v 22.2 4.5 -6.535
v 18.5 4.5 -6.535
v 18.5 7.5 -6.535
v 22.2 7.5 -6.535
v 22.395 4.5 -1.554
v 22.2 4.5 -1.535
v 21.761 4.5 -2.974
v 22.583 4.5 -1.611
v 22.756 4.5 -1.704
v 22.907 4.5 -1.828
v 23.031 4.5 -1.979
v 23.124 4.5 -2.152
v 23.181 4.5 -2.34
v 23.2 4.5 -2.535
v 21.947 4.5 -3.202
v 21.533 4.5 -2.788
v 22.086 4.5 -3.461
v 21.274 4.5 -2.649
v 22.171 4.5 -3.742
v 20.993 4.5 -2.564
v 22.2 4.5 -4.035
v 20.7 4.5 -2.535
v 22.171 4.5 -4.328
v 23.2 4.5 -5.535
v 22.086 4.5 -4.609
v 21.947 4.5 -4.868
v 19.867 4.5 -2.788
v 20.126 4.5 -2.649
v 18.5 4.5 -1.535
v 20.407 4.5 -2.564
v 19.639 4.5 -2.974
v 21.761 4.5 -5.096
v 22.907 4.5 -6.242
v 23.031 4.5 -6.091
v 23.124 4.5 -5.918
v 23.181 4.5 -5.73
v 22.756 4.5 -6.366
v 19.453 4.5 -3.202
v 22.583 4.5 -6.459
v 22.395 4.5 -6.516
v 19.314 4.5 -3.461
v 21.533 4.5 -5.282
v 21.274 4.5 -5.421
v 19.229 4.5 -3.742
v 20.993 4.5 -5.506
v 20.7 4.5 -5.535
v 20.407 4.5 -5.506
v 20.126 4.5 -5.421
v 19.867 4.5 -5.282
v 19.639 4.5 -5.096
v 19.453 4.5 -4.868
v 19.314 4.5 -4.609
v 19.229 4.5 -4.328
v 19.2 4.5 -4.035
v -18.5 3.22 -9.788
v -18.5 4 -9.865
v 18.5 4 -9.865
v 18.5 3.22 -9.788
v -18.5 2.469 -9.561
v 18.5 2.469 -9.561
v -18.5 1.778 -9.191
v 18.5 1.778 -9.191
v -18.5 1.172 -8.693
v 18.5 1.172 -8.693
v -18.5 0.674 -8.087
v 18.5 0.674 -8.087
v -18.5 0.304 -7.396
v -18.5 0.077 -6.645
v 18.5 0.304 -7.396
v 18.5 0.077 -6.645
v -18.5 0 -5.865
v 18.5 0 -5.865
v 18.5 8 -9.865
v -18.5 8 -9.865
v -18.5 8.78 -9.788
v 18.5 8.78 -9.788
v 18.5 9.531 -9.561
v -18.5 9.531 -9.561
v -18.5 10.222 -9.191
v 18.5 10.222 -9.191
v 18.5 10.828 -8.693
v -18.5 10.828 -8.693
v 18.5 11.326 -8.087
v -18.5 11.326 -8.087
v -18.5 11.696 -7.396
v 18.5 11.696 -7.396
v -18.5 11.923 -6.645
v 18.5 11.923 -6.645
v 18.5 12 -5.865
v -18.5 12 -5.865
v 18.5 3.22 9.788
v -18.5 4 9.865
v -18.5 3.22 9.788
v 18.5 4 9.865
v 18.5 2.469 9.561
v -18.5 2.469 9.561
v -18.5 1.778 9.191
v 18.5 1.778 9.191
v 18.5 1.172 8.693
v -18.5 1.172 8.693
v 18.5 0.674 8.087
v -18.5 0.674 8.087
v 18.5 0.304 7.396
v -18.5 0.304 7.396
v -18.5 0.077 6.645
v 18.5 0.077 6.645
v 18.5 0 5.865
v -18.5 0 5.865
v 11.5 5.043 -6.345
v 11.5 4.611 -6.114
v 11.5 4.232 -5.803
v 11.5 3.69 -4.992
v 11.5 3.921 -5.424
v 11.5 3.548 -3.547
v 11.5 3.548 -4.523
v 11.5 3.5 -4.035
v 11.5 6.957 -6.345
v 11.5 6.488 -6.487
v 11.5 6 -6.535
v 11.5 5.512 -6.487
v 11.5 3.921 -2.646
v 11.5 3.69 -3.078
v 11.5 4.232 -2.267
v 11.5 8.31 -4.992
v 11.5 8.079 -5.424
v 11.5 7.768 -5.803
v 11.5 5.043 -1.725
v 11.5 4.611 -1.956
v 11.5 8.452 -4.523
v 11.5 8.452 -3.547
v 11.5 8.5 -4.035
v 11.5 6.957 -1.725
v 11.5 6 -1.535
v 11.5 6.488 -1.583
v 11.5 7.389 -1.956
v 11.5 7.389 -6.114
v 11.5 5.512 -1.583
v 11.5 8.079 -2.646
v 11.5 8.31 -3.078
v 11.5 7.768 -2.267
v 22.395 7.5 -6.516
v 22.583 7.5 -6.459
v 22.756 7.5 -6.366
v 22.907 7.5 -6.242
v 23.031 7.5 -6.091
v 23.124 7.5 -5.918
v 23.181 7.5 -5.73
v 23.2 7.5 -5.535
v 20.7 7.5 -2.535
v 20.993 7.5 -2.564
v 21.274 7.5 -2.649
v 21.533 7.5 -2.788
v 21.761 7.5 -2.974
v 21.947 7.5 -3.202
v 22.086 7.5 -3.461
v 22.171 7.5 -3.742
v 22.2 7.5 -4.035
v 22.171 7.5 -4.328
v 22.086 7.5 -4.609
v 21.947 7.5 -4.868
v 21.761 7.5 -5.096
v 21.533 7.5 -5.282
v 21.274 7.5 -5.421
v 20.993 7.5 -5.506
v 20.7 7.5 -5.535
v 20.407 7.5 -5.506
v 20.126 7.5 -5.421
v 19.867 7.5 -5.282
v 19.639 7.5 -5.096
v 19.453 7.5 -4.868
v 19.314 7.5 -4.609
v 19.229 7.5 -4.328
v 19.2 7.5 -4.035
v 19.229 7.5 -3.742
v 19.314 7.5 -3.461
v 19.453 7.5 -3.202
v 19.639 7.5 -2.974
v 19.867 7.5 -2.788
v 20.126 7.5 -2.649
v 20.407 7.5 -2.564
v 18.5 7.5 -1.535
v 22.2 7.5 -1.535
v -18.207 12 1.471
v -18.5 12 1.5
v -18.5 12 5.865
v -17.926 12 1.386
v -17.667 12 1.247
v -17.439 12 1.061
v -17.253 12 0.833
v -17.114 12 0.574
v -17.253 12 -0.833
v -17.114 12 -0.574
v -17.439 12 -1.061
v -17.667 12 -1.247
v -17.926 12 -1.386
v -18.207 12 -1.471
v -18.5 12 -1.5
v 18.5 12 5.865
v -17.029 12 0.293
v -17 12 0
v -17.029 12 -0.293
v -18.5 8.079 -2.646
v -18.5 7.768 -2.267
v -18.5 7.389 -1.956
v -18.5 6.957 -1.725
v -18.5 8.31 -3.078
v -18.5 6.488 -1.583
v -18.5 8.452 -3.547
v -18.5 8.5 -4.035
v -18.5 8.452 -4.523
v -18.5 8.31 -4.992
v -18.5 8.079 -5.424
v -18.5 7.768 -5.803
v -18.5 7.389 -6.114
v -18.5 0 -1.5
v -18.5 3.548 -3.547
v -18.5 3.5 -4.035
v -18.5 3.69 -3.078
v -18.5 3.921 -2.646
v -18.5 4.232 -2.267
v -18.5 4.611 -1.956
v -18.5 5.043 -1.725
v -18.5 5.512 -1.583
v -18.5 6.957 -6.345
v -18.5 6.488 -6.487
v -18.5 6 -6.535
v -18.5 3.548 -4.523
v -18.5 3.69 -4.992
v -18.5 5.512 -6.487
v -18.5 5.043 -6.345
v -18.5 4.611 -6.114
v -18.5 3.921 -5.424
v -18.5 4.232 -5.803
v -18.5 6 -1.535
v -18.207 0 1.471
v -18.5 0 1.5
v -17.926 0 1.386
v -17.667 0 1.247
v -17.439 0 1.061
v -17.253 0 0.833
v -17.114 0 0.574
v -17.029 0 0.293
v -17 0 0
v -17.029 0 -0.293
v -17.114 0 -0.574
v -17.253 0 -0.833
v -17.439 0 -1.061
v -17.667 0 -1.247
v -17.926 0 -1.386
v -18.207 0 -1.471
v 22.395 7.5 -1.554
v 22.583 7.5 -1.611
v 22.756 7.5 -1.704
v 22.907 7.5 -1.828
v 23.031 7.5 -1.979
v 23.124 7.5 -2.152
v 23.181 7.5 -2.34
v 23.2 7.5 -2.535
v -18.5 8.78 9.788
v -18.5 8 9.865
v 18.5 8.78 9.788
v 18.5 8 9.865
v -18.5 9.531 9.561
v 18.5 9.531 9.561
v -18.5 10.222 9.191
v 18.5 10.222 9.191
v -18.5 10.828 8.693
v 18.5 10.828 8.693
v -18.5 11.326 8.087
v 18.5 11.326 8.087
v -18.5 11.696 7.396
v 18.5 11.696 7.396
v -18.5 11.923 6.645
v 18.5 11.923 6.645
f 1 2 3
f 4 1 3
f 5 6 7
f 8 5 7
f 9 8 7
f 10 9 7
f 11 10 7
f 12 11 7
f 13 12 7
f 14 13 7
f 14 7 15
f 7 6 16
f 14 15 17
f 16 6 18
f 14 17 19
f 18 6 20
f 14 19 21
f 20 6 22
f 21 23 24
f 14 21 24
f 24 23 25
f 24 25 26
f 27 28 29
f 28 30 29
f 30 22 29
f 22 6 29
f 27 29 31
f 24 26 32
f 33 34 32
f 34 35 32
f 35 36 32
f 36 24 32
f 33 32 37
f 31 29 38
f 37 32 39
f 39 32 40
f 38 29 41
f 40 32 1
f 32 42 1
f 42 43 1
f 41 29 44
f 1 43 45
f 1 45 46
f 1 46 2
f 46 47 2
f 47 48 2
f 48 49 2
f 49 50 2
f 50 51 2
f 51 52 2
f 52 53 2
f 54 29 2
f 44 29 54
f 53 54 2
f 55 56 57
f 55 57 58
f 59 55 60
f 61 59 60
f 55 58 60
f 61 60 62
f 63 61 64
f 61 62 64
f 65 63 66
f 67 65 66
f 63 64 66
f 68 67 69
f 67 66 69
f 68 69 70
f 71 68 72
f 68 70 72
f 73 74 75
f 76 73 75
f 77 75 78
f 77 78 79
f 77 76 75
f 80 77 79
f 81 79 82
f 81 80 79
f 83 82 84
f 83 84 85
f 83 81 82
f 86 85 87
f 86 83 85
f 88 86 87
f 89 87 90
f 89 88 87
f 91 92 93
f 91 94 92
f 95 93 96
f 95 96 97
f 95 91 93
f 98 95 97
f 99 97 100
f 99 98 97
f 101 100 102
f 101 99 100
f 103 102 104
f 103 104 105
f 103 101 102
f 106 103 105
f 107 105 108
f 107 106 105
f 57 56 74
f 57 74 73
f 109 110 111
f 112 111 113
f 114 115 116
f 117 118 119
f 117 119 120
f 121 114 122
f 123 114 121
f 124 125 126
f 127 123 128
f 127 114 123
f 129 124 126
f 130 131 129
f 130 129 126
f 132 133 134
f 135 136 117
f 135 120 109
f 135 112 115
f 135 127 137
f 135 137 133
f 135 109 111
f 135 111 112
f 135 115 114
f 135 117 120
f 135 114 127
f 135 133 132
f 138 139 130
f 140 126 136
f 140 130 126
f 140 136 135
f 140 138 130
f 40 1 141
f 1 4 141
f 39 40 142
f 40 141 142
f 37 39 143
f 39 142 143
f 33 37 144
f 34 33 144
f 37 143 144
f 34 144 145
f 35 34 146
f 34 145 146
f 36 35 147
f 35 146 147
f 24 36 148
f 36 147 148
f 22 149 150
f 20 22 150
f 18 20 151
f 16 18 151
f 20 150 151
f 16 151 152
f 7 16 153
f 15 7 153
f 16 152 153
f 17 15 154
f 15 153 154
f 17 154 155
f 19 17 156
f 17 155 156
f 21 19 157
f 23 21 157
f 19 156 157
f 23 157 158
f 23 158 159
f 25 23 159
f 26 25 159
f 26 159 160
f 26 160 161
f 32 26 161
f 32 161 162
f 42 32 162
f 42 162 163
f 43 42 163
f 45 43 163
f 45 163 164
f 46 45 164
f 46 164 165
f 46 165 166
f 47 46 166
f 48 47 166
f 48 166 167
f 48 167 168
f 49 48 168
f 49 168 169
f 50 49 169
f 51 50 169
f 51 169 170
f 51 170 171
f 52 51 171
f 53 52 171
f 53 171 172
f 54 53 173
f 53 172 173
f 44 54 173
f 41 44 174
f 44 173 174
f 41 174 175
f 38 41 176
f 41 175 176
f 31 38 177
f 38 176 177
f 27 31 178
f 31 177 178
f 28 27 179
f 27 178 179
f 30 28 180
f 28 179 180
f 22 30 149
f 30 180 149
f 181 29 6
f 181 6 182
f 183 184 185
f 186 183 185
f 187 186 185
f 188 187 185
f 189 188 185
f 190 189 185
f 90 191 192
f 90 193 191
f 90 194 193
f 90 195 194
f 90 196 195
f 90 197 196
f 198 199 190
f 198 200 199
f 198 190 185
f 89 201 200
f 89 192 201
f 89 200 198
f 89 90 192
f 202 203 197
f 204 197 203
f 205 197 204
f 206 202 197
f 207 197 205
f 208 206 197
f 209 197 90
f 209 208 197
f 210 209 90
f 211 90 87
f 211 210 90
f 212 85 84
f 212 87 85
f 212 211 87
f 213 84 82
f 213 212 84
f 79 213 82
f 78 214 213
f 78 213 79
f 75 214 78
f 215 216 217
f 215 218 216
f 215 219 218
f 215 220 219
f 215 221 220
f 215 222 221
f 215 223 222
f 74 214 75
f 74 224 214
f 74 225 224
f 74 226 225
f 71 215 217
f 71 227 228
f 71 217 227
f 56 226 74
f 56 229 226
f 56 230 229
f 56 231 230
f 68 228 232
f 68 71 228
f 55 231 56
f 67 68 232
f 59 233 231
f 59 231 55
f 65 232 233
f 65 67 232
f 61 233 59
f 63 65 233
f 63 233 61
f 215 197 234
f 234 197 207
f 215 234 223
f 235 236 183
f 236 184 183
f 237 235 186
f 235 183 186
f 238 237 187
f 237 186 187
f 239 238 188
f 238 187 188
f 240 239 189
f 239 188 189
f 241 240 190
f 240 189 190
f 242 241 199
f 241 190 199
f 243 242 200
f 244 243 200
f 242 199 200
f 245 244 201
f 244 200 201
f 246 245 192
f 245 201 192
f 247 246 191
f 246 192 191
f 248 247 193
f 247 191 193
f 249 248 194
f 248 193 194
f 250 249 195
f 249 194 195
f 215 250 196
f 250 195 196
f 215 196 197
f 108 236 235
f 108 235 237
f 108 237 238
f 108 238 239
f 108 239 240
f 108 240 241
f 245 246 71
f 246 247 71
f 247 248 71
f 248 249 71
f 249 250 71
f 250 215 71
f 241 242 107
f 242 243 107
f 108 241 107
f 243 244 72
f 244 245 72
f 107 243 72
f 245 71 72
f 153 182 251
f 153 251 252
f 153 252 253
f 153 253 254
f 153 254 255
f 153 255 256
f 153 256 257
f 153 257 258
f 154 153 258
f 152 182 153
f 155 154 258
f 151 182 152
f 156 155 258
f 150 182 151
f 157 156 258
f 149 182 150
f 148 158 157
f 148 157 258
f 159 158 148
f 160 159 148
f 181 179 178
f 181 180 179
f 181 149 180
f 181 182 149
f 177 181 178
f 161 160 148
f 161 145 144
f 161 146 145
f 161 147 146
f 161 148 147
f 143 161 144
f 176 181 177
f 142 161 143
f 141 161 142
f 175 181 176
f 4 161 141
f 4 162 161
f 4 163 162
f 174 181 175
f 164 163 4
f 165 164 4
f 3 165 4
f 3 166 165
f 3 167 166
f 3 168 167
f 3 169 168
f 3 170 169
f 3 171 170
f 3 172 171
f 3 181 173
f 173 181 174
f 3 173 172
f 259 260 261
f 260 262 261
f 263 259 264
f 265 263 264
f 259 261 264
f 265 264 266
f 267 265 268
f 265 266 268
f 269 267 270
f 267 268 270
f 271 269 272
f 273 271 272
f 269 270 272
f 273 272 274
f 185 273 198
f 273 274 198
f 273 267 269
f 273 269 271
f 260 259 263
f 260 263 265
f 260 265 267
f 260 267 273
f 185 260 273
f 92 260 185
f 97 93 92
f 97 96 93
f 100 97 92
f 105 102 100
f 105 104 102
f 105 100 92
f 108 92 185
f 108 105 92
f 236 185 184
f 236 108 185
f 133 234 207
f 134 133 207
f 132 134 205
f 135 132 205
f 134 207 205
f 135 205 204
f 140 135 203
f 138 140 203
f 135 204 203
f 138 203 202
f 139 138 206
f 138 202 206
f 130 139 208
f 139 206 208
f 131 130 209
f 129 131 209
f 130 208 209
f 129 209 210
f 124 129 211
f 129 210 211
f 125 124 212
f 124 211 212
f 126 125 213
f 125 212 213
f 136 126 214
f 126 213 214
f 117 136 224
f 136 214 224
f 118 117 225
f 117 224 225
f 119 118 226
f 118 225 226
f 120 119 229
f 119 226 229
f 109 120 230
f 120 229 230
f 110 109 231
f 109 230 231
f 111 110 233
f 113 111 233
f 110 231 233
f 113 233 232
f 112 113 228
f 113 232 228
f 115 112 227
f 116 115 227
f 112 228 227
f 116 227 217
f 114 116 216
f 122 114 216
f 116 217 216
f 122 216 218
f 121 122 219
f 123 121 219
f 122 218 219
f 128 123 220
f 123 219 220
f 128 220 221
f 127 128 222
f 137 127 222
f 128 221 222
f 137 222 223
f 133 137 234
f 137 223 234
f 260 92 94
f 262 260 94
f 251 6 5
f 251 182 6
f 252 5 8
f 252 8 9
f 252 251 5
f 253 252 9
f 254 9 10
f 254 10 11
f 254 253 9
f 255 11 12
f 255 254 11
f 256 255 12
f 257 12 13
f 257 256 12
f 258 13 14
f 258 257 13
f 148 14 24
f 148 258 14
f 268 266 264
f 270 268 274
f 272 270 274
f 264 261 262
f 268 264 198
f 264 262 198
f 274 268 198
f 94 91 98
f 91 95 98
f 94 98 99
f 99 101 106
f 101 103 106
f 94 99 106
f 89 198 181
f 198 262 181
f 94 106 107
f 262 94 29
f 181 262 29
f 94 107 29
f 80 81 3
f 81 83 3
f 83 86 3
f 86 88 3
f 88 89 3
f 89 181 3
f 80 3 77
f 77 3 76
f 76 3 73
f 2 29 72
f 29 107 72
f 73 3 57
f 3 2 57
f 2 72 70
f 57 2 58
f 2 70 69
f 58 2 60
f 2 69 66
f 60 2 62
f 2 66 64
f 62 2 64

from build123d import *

# Parameters (mm, degrees)
SKETCH_1_W          = 37
SKETCH_1_H          = 19.73
EXTRUDE_1_DEPTH     = 12
SKETCH_2_R          = 1.5
CUT_EXTRUDE_1_DEPTH = 25.157156807
FILLET_2_R          = 4
SKETCH_3_R          = 2.5
CUT_EXTRUDE_2_DEPTH = 30
SKETCH_4_W          = 5
SKETCH_4_H          = 3
EXTRUDE_2_DEPTH     = 4.7
SKETCH_5_R          = 1.5
CUT_EXTRUDE_3_DEPTH = 27.302247528
FILLET_3_R          = 1


with BuildPart() as part:
    # 草图1 → 凸台-拉伸1 (new body)
    with BuildSketch(Plane(origin=(0, 0, 0), x_dir=(1, 0, 0), z_dir=(0, 1, 0))):
        Rectangle(SKETCH_1_W, SKETCH_1_H)
    extrude(amount=EXTRUDE_1_DEPTH)

    # 草图2 → 切除-拉伸1 (cut, through all)
    with BuildSketch(Plane(origin=(0, 12, 0), x_dir=(1, 0, 0), z_dir=(0, 1, 0))):
        with Locations((-18.5, 0)):
            Circle(SKETCH_2_R)
    extrude(amount=-CUT_EXTRUDE_1_DEPTH, mode=Mode.SUBTRACT)

    # 圆角2
    fillet_2_edges = [part.edges().sort_by_distance(p)[0] for p in [
        (0, 12, -9.865),
        (0, 0, -9.865),
        (0, 0, 9.865),
        (0, 12, 9.865),
    ]]
    fillet(fillet_2_edges, radius=FILLET_2_R)

    # 草图3 → 切除-拉伸2 (cut)
    with BuildSketch(Plane.ZY.offset(18.5)):
        with Locations((-4.035, 6)):
            Circle(SKETCH_3_R)
    extrude(amount=-CUT_EXTRUDE_2_DEPTH, mode=Mode.SUBTRACT)

    # 草图4 → 凸台-拉伸2 (add)
    with BuildSketch(Plane(origin=(18.5, 0, 0), x_dir=(0, 0, -1), z_dir=(1, 0, 0))):
        with Locations((4.035, 6)):
            Rectangle(SKETCH_4_W, SKETCH_4_H)
    extrude(amount=EXTRUDE_2_DEPTH)

    # 草图5 → 切除-拉伸3 (cut, through all)
    with BuildSketch(Plane(origin=(0, 7.5, 0), x_dir=(1, 0, 0), z_dir=(0, 1, 0))):
        with Locations(Location((20.7, 4.035, 0), (0, 0, 270))):
            Circle(SKETCH_5_R)
    extrude(amount=-CUT_EXTRUDE_3_DEPTH, mode=Mode.SUBTRACT)

    # 圆角3
    fillet_3_edges = [part.edges().sort_by_distance(p)[0] for p in [
        (23.2, 6, -6.535),
        (23.2, 6, -1.535),
    ]]
    fillet(fillet_3_edges, radius=FILLET_3_R)


solid = part.part
